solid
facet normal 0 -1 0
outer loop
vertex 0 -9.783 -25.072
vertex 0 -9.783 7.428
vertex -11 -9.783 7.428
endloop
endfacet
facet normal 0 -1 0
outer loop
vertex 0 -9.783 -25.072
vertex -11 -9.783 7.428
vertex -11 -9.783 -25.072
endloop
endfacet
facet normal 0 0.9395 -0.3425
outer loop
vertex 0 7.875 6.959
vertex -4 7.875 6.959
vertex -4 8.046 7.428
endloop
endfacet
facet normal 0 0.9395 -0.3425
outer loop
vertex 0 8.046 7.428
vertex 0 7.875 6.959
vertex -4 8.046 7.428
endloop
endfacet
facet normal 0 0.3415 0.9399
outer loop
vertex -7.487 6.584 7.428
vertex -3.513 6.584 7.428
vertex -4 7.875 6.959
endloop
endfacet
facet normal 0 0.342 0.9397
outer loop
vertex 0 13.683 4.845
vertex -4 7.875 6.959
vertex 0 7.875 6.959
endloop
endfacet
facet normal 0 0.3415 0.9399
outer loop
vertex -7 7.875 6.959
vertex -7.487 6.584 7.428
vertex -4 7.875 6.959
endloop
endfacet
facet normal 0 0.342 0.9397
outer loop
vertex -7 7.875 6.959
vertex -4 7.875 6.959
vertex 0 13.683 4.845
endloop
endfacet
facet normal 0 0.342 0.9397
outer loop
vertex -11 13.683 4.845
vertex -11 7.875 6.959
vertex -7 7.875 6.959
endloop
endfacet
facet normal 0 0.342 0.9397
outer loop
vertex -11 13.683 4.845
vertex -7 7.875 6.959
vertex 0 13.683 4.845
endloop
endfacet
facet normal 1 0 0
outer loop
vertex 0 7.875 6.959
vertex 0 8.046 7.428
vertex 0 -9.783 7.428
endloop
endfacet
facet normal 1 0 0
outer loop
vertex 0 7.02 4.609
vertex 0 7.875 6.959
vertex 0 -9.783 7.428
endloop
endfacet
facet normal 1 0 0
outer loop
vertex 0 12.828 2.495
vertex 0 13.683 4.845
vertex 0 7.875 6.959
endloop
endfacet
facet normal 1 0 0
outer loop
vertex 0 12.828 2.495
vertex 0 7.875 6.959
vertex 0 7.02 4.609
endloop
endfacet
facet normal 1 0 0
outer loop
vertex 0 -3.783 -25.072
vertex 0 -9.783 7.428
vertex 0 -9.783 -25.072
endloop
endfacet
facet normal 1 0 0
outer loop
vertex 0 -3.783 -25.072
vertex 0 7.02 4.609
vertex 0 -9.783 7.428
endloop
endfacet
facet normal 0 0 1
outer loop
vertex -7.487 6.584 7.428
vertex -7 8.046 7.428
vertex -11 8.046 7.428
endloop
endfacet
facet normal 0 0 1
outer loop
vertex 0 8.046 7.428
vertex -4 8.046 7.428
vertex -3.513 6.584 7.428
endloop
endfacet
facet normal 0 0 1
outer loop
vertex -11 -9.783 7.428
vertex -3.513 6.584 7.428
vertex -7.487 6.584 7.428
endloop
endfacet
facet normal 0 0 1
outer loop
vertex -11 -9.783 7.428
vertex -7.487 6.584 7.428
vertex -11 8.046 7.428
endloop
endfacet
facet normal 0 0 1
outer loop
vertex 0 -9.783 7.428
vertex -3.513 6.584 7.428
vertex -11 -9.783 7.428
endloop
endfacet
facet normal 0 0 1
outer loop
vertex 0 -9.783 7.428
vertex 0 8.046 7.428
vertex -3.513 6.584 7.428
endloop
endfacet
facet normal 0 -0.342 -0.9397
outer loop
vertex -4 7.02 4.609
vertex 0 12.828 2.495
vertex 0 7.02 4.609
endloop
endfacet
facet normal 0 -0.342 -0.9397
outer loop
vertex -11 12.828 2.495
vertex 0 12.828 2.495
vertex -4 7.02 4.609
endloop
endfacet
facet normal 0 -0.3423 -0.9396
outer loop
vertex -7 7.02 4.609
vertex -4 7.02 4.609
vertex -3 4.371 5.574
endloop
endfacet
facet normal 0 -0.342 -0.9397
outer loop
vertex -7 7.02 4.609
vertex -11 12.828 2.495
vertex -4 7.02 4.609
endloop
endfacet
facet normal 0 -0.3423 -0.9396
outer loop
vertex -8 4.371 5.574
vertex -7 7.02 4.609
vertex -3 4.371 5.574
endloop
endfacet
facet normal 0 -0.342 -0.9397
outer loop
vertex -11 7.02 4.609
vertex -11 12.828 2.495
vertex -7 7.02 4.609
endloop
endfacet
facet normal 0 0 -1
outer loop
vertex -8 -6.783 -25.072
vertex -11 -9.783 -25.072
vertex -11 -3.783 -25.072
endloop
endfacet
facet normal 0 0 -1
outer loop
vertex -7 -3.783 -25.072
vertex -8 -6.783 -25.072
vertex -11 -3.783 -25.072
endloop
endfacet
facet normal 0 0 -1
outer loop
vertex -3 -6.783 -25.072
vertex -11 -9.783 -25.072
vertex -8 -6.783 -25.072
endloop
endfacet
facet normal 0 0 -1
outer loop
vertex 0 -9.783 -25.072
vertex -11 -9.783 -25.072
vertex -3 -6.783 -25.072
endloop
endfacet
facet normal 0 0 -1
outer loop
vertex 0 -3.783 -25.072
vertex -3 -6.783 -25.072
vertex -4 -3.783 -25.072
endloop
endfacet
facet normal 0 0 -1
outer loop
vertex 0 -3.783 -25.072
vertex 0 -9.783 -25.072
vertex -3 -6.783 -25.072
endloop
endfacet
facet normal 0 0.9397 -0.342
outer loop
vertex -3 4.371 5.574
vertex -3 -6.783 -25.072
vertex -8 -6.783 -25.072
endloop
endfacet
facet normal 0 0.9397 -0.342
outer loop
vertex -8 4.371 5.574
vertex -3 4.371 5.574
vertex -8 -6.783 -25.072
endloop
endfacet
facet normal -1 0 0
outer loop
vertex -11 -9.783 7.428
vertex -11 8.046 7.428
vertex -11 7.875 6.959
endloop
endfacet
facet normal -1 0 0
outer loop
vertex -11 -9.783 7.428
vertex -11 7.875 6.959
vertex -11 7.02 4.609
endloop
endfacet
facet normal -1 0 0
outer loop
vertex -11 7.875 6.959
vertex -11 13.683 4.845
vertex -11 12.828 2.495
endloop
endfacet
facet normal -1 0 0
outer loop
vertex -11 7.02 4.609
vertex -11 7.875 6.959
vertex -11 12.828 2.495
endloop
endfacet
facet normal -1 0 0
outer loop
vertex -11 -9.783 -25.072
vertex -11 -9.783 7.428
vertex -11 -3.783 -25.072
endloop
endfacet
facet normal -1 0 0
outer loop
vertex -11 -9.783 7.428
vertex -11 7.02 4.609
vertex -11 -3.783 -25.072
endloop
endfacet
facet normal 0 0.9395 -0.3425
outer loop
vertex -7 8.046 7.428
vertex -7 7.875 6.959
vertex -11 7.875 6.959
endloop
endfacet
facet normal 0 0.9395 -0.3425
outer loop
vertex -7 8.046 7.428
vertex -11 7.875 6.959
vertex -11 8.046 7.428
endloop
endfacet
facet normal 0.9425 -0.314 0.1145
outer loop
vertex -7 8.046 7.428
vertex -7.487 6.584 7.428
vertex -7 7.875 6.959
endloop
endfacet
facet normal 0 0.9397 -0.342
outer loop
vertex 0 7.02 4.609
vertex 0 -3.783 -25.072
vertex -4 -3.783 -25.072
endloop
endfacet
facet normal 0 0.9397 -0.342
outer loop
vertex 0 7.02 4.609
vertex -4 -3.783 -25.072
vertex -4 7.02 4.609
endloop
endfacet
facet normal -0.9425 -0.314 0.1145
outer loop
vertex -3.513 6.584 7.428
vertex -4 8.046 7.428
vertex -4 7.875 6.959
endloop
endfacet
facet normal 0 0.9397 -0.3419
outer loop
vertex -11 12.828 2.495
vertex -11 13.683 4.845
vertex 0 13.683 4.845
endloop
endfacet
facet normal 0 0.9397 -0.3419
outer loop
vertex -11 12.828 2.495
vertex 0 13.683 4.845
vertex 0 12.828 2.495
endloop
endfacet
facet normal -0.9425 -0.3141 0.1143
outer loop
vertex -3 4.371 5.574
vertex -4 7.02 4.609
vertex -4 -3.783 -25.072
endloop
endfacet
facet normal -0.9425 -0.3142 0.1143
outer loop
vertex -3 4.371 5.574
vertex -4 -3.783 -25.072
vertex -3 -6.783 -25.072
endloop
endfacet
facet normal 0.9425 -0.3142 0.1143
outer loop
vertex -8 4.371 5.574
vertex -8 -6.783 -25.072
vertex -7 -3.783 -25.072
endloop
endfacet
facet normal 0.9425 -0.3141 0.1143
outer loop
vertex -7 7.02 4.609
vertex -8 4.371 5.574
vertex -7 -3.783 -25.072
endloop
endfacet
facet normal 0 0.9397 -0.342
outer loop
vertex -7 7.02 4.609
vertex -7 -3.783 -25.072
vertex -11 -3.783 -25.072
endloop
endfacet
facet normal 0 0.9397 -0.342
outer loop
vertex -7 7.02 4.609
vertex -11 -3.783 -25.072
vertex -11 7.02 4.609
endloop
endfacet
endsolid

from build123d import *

# Parameters (mm, degrees)
BOSS_EXTRUDE1_DEPTH = 11
BOSS_EXTRUDE2_REACH = 31.074


with BuildPart() as part:
    # Sketch2 → Boss-Extrude1 (new body)
    with BuildSketch(Plane(origin=(0, 0, 0), x_dir=(0, 0, -1), z_dir=(1, 0, 0))):
        Polygon((-7.428495294, -9.782945939), (25.071504706, -9.782945939), (25.071504706, -3.782945939), (-7.428495294, 8.046086675), align=None)
    extrude(amount=-BOSS_EXTRUDE1_DEPTH)

    # Cut-Sweep3: sweep along a path in Sketch5
    with BuildLine(Plane.ZY.offset(11)) as cut_sweep3_path:
        Line((-25.071504706, -6.975479256), (8.757429642, 5.337245904))
    # Sketch3 → Cut-Sweep3 (sweep, cut)
    with BuildSketch(Plane(origin=(0, 0, -25.071504706), x_dir=(-1, 0, 0), z_dir=(0, 0, -1))):
        Polygon((3, -6.782945939), (8, -6.782945939), (7, -3.782945939), (4, -3.782945939), align=None)
    sweep(path=cut_sweep3_path.line, mode=Mode.SUBTRACT)

    # Boss-Extrude2: up to this face of the body (flat: up to its plane)
    boss_extrude2_end = Plane(part.part.faces().sort_by_distance((0, -3.336347692, -6.132602991))[0])
    # Sketch6 → Boss-Extrude2 (add, up to the picked face)
    with BuildSketch(Plane.ZY.offset(11), mode=Mode.PRIVATE) as boss_extrude2_sk1:
        Polygon((5.573598846, 4.37095958), (7.428495294, 5.046086675), (7.428495294, 6.584184475), (4.844649108, 13.683243526), (2.495417556, 12.828193167), align=None)
    boss_extrude2_tool1 = split(extrude(boss_extrude2_sk1.sketch, amount=-BOSS_EXTRUDE2_REACH, mode=Mode.PRIVATE), bisect_by=boss_extrude2_end, keep=Keep.BOTH, mode=Mode.PRIVATE)
    add(boss_extrude2_tool1.solids().sort_by(Axis((-11, 9.08568, 5.168148), (1, 0, 0)))[0])


solid = part.part
